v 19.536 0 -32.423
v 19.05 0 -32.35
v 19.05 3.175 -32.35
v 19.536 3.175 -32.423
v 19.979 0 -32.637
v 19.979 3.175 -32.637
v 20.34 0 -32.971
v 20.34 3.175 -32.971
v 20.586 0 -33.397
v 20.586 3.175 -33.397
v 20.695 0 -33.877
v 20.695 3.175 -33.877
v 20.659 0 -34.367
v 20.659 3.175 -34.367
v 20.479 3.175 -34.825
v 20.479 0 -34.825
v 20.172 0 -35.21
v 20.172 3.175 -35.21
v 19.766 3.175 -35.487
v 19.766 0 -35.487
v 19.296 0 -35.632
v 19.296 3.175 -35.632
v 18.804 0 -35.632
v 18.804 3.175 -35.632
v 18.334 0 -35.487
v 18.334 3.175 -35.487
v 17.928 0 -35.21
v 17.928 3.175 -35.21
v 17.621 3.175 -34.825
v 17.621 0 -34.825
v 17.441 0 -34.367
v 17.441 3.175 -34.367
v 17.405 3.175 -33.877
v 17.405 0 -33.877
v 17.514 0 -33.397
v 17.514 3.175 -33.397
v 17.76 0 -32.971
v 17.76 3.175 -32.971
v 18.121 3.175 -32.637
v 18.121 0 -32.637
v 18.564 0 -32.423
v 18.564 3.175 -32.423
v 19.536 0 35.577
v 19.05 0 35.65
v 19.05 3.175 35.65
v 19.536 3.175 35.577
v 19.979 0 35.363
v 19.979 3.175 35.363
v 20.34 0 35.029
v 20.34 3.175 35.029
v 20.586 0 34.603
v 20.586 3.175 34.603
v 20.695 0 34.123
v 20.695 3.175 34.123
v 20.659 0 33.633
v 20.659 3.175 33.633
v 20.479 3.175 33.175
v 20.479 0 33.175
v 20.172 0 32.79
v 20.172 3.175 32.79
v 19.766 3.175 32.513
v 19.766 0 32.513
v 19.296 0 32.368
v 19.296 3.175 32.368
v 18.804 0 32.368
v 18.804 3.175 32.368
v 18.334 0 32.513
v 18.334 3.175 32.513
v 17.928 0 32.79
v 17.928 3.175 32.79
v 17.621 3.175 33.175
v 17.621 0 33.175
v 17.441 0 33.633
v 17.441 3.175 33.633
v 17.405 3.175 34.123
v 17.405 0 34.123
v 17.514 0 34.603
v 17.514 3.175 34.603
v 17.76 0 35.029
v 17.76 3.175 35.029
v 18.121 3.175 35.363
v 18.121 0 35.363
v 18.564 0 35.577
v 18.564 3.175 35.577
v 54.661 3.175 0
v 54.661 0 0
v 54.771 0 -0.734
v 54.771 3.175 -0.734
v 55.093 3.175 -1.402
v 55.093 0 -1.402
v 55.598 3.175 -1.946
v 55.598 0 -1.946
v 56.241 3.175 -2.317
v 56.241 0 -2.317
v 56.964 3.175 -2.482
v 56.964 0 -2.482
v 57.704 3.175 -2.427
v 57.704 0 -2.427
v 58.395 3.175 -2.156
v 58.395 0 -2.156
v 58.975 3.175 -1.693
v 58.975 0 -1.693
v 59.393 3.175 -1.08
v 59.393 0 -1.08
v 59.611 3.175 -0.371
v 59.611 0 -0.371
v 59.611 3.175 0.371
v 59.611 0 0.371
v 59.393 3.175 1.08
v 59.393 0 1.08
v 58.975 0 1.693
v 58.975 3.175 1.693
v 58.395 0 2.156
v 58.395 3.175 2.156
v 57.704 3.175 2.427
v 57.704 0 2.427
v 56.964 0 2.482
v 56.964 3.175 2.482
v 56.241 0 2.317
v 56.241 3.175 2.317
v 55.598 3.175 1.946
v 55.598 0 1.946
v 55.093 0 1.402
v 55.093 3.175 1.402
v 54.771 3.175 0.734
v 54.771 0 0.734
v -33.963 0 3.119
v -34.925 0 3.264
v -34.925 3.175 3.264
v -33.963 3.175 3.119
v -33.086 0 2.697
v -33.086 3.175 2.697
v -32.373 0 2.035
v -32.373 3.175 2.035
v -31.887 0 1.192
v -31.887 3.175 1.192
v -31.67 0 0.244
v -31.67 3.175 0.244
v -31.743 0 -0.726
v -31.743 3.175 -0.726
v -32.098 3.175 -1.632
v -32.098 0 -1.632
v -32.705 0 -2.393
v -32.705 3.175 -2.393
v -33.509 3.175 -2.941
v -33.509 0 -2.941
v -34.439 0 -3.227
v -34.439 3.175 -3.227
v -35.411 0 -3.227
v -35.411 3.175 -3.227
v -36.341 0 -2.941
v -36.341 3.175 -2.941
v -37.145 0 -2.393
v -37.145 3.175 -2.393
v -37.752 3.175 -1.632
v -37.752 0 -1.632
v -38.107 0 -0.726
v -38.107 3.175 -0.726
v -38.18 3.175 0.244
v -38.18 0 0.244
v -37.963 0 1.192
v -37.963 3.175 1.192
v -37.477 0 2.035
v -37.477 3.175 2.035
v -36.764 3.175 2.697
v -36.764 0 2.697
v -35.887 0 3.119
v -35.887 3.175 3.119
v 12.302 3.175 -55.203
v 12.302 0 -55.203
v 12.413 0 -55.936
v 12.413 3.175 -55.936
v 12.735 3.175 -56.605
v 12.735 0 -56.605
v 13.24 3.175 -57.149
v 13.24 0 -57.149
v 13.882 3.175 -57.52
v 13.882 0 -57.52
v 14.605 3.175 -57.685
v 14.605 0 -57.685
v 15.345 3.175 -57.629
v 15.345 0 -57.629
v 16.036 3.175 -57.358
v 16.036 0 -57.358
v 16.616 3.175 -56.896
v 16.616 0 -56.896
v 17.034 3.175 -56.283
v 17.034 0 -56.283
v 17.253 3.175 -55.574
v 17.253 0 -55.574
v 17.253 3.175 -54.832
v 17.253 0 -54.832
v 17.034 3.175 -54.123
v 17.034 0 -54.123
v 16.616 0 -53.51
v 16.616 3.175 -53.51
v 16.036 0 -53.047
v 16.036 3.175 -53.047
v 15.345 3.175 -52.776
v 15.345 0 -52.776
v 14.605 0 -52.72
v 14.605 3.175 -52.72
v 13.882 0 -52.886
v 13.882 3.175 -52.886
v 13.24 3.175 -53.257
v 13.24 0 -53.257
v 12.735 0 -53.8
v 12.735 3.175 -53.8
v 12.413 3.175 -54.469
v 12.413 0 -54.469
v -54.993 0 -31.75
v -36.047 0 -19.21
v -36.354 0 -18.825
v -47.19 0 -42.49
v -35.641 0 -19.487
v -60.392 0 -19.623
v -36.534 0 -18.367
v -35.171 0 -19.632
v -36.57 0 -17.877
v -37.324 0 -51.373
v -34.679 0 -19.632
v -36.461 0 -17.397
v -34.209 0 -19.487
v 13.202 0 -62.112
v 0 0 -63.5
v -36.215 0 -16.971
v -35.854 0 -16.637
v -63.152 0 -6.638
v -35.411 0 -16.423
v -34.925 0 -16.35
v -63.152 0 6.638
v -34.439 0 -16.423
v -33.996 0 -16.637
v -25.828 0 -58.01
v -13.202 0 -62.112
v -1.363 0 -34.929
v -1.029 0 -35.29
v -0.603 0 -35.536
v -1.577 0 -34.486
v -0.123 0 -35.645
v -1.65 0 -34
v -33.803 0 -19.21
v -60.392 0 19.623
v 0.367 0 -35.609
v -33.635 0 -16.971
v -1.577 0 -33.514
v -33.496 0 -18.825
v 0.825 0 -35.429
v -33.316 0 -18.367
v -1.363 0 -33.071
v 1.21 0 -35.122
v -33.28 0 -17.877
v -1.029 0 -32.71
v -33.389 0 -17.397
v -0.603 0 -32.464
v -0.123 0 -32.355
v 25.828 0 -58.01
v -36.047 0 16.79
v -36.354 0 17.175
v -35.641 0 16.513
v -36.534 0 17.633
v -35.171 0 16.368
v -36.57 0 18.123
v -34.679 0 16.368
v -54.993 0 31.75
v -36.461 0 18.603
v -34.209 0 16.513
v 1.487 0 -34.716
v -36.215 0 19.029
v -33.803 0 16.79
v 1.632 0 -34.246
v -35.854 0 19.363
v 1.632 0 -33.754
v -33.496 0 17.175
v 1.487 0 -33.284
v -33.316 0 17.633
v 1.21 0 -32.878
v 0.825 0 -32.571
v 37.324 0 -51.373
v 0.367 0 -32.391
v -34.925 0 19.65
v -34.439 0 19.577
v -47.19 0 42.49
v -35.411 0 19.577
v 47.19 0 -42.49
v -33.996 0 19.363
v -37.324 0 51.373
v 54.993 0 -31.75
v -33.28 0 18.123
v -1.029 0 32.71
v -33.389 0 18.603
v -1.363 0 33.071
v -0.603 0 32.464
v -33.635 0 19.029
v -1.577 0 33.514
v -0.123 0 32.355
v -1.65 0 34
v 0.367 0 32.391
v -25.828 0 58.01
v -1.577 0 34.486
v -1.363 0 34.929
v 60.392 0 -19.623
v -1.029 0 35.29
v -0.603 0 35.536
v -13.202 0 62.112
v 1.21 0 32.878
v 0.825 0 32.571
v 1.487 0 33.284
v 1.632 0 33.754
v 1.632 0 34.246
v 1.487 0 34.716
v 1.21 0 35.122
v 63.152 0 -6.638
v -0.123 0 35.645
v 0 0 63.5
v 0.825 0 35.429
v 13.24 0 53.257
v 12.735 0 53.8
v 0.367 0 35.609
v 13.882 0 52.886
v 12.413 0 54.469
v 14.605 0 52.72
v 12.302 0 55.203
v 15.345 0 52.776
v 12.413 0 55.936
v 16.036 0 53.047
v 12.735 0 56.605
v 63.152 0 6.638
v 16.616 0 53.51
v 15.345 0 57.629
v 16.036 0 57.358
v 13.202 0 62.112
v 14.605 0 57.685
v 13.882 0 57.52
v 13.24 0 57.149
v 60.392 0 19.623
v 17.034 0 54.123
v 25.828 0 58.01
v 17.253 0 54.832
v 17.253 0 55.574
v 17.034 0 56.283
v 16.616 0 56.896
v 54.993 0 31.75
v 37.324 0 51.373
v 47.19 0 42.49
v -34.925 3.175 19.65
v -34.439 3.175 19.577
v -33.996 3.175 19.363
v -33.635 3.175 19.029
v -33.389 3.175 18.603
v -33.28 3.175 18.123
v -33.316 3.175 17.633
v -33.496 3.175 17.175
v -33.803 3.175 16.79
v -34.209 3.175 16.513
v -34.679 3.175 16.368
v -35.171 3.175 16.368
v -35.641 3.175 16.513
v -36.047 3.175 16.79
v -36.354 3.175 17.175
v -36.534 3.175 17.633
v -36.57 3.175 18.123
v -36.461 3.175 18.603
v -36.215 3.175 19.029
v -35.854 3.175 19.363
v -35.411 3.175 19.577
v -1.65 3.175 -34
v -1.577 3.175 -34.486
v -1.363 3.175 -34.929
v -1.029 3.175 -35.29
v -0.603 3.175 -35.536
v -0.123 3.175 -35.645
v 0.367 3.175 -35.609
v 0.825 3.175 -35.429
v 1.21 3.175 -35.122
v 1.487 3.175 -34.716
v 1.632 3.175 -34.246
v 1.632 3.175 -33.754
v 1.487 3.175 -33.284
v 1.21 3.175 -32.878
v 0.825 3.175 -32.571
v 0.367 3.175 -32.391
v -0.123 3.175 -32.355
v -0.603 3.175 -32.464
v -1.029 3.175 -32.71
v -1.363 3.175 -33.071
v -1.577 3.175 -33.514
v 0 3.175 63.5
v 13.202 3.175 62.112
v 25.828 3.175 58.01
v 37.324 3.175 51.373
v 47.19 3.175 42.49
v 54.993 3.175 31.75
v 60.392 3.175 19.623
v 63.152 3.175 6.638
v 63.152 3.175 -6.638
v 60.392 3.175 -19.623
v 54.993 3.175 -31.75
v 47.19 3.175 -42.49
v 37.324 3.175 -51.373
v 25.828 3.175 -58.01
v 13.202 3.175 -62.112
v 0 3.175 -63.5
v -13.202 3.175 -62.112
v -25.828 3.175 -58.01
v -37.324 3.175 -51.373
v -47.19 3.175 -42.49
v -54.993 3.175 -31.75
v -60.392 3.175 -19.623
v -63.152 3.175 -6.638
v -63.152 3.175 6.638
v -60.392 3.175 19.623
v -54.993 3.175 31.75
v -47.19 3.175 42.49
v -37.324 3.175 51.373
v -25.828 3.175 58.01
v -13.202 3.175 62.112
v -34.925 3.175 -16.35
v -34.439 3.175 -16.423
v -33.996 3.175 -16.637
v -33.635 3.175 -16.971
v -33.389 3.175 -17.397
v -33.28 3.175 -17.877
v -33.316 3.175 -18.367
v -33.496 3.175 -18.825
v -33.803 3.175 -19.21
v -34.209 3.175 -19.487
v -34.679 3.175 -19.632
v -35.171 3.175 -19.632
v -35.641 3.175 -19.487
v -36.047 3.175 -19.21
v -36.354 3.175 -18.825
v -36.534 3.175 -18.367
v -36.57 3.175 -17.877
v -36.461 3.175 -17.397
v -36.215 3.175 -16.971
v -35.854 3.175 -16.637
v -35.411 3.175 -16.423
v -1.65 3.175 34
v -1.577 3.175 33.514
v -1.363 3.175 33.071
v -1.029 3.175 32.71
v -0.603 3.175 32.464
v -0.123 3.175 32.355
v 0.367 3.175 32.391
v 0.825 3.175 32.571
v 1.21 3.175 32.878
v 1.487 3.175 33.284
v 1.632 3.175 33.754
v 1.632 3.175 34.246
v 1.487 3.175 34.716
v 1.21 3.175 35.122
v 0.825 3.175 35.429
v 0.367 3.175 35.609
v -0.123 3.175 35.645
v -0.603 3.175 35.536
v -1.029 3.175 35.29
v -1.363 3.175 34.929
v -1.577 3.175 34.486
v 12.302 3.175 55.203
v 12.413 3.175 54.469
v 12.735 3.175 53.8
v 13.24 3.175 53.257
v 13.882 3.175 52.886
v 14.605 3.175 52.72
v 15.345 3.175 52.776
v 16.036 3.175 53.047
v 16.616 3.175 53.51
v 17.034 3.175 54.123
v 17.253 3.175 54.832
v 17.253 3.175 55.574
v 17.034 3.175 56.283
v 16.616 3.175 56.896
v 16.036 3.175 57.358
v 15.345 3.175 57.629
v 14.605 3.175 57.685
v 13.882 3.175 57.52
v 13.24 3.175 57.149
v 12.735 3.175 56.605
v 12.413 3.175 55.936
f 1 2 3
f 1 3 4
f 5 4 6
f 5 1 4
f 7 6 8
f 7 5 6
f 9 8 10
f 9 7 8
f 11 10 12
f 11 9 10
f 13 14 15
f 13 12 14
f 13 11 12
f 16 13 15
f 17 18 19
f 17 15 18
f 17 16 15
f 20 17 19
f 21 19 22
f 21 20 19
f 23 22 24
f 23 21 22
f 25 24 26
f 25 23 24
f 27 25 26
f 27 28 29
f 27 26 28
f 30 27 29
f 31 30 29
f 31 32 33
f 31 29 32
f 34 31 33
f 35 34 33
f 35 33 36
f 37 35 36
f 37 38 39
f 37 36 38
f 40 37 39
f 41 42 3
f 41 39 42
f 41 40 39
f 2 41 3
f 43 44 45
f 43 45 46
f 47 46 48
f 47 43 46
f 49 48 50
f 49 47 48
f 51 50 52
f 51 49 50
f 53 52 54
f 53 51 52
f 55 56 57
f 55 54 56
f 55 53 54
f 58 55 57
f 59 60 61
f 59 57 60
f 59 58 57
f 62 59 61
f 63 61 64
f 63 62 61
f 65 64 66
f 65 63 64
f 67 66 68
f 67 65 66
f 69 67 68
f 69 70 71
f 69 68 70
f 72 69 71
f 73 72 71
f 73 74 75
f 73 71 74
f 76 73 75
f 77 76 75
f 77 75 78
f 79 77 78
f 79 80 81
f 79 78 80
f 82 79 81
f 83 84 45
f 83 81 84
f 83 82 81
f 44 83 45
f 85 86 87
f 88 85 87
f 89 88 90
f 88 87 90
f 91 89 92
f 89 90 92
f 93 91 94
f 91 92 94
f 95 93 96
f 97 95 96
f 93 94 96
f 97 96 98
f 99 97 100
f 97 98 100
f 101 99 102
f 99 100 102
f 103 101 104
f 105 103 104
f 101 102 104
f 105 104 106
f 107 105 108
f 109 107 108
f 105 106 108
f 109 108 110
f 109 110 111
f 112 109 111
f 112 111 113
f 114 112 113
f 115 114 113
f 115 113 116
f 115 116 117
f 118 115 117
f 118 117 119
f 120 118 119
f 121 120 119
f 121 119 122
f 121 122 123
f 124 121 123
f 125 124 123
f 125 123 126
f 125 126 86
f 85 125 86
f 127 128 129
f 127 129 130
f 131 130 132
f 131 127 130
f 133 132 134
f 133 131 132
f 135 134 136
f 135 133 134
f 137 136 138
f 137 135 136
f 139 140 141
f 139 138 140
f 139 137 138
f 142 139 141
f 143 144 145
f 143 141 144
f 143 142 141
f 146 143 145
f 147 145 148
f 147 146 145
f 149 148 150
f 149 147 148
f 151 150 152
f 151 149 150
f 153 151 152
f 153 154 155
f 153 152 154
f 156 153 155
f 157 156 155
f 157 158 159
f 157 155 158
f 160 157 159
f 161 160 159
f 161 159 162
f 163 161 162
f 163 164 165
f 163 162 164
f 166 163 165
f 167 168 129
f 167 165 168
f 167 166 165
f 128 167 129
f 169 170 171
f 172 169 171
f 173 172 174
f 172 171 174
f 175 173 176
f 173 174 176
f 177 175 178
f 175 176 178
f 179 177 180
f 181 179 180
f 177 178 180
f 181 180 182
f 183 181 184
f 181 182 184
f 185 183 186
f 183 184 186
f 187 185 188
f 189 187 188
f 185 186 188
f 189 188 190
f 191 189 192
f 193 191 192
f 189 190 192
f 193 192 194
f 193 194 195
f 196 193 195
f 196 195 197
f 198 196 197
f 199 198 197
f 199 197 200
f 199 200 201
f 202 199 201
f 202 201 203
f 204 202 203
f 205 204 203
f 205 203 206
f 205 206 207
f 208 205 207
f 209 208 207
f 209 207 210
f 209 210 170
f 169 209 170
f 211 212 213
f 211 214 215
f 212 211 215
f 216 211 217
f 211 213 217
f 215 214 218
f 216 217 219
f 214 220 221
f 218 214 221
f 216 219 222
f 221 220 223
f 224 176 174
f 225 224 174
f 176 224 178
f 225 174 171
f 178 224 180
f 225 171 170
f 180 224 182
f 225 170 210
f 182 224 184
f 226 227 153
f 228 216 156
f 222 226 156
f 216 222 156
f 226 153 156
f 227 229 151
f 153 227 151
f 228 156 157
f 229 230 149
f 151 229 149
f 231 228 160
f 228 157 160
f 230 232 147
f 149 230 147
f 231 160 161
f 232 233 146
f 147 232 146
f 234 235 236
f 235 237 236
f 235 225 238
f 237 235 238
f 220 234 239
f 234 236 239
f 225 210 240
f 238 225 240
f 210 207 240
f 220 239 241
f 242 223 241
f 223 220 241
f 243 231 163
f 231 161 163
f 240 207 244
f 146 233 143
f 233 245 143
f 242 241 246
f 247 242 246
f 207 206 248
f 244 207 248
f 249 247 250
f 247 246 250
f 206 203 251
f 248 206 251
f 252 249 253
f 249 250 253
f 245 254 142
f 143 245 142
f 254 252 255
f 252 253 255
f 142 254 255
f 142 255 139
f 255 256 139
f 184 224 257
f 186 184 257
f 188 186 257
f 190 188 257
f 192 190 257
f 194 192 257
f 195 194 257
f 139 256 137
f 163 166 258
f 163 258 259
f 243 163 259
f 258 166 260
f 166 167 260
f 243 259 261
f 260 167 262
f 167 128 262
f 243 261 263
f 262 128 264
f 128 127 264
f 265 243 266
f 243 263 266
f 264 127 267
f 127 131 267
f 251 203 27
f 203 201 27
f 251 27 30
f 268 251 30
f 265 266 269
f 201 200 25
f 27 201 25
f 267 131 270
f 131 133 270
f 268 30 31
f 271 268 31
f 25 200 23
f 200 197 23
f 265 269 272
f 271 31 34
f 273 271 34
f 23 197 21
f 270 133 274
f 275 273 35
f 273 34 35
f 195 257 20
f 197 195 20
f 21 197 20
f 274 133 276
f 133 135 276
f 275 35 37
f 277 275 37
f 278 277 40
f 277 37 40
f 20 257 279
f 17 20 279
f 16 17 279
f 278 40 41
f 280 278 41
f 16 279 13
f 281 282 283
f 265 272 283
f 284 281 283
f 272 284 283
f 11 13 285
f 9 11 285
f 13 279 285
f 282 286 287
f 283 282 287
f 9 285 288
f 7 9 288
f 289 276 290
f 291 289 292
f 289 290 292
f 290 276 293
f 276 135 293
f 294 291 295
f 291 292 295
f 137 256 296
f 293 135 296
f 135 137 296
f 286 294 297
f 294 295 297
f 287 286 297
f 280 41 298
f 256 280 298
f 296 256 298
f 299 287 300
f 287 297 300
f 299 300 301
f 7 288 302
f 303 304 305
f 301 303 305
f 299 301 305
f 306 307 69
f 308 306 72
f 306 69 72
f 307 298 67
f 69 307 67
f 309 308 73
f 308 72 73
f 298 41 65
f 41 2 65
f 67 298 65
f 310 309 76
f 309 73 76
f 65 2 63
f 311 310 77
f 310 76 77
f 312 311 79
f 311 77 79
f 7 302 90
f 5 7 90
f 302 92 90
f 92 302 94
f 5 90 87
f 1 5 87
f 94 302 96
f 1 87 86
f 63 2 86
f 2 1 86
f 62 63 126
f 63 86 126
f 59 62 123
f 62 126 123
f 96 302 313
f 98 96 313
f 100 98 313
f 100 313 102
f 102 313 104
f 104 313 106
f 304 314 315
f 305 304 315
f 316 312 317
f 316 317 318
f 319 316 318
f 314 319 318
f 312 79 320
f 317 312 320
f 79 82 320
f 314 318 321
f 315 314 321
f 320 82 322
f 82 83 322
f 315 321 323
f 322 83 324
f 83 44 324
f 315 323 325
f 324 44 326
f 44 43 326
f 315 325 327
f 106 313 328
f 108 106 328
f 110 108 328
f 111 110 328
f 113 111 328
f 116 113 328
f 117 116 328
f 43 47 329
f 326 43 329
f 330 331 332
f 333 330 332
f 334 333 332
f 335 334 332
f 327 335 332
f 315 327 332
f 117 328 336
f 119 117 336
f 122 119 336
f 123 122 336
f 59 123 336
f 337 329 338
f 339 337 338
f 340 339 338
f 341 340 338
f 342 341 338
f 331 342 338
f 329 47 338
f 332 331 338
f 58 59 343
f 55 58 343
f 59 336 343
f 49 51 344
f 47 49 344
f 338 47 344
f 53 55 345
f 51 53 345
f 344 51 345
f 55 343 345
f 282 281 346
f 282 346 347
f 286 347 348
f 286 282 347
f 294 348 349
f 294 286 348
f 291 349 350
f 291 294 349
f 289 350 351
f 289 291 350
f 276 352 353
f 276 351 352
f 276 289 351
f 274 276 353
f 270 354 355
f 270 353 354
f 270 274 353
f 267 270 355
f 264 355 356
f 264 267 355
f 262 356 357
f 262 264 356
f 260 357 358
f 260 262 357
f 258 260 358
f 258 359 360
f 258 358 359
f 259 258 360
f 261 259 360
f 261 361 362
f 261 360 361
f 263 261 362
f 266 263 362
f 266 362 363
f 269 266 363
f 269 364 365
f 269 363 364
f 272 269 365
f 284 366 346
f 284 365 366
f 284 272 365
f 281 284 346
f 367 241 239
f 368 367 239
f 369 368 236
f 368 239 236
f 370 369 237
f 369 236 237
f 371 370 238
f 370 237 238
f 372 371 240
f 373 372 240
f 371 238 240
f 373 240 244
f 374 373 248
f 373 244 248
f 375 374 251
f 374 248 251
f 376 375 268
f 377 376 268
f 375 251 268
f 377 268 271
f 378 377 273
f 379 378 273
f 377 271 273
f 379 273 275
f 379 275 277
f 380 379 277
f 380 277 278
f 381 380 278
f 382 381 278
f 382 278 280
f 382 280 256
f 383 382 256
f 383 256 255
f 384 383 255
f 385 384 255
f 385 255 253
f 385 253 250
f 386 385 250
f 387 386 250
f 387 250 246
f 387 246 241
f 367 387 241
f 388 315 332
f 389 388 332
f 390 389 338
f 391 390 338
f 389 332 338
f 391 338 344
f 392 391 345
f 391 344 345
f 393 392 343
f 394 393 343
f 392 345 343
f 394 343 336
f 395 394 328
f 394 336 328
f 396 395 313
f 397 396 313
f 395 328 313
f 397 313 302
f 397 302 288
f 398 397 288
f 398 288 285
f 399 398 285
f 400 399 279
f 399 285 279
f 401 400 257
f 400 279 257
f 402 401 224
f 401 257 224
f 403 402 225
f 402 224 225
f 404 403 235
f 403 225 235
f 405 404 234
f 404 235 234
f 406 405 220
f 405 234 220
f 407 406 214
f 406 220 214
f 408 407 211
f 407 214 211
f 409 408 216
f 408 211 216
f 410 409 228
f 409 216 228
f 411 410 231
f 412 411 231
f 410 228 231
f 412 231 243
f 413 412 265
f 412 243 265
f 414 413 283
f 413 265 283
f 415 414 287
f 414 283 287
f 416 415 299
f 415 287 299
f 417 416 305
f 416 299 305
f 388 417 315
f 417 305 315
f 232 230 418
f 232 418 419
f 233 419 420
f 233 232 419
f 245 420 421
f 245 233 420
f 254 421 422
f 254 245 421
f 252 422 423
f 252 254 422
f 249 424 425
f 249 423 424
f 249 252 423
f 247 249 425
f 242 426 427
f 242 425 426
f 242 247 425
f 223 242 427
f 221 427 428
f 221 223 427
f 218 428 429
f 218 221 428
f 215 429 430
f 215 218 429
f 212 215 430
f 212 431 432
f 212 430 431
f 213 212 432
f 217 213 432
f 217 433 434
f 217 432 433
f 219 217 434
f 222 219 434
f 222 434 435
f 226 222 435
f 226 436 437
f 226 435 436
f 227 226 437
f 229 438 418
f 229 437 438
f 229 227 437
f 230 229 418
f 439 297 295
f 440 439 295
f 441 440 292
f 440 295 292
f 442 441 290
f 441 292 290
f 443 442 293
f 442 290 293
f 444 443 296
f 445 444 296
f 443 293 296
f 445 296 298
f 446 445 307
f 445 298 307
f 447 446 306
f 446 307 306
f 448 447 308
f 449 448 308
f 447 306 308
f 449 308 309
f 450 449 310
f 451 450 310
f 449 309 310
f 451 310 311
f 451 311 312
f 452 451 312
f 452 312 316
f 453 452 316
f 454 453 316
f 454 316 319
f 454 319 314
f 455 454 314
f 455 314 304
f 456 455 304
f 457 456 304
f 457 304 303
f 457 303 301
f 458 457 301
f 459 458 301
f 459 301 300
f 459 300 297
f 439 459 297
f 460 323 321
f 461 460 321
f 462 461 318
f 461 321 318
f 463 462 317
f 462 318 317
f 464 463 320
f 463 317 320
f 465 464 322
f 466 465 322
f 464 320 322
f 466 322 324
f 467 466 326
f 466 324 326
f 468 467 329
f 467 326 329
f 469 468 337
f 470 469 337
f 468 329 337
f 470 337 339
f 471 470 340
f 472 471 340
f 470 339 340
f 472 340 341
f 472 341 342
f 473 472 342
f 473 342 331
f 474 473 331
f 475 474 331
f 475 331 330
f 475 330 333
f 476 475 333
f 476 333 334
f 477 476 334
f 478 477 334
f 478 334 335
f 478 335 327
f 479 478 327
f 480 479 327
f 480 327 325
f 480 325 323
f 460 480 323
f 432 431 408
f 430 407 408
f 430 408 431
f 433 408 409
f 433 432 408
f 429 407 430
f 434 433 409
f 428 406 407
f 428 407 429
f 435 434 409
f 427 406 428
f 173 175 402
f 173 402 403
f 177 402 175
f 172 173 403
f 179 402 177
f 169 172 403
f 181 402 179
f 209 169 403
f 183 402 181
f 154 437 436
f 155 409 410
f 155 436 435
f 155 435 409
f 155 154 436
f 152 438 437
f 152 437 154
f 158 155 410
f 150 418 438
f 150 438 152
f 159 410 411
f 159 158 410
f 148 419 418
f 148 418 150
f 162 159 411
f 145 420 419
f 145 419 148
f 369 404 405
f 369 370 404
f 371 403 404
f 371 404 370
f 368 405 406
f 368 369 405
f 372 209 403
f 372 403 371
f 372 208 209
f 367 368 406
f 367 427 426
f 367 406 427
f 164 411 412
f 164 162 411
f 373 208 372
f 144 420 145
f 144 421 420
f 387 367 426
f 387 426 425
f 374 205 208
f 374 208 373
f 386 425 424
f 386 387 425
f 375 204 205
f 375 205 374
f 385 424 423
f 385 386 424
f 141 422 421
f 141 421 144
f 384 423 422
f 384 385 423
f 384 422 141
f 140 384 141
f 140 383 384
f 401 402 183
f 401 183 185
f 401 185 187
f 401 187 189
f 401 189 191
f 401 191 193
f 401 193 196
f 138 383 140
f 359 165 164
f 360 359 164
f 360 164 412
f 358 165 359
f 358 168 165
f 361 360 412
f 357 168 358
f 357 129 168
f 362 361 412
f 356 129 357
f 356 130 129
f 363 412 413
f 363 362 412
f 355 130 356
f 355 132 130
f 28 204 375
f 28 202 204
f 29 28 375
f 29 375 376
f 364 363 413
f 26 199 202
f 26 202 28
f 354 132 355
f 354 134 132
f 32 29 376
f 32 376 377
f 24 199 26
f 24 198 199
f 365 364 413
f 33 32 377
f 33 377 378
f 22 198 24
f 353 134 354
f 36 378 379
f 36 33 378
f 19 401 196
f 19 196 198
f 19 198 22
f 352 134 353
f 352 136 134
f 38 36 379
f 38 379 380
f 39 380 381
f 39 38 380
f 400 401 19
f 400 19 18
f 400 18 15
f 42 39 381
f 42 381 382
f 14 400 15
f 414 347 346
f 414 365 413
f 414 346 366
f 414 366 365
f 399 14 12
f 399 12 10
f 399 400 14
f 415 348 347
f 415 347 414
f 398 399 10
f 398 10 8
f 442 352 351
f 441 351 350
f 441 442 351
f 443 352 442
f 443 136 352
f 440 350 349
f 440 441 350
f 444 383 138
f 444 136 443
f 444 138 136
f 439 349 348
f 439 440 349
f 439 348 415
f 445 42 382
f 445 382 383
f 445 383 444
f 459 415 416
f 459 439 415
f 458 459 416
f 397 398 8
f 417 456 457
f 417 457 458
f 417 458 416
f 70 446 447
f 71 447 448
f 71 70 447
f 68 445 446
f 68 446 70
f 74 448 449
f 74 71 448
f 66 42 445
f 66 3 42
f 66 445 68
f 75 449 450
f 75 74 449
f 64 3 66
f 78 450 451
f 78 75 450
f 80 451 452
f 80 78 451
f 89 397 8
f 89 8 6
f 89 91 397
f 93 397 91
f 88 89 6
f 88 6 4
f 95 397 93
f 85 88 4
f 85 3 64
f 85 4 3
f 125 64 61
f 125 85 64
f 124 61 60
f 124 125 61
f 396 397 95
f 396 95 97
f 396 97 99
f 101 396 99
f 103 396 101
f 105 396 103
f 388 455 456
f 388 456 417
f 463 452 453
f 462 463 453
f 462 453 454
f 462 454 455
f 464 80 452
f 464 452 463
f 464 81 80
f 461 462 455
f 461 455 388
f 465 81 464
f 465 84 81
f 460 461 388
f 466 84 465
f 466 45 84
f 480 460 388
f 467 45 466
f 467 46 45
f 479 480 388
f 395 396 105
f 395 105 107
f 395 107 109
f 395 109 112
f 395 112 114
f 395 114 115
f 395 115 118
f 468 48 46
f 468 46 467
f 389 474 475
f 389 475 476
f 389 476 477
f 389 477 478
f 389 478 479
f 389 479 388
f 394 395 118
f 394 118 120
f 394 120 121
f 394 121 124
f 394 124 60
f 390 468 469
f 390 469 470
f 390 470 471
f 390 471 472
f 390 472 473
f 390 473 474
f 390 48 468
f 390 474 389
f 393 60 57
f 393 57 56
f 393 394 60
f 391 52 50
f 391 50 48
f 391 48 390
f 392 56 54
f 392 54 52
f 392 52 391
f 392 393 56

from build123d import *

# Parameters (mm, degrees)
SKETCH1_R                   = 63.5
BOSS_EXTRUDE1_DEPTH         = 3.175
TAP_DRILL_FOR_M4X0_7_TAP1_D = 3.3
F_9_0_196_DIAMETER_HOLE1_D  = 4.9784
CUT_EXTRUDE1_DEPTH          = 90.858670283
CUT_EXTRUDE1_DEPTH_BACK     = 90.858670283
SKETCH12_R                  = 3.2639
SKETCH12_R_2                = 1.65


with BuildPart() as part:
    # Sketch1 → Boss-Extrude1 (new body)
    with BuildSketch(Plane(origin=(0, 0, 0), x_dir=(1, 0, 0), z_dir=(0, 1, 0))):
        with Locations(Location((0, 0, 0), (0, 0, 270))):
            Circle(SKETCH1_R)
    extrude(amount=BOSS_EXTRUDE1_DEPTH)

    # Tap Drill for M4x0.7 Tap1 (through all)
    with Locations(Plane(origin=(0, 3.175, 0), x_dir=(1, 0, 0), z_dir=(0, 1, 0))):
        with Locations((0, 34), (0, -34)):
            Hole(TAP_DRILL_FOR_M4X0_7_TAP1_D / 2)

    # #9 (0.196) Diameter Hole1 (through all)
    with Locations(Plane(origin=(0, 3.175, 0), x_dir=(1, 0, 0), z_dir=(0, 1, 0))):
        with Locations((14.791508428, 55.202660972), (57.15, 0), (14.791508428, -55.202660972)):
            Hole(F_9_0_196_DIAMETER_HOLE1_D / 2)

    # Sketch12 → Cut-Extrude1 (cut, two sides: drawn at the far end of the back side and taken through both)
    with BuildSketch(Plane(origin=(0, 3.175, 0), x_dir=(1, 0, 0), z_dir=(0, 1, 0)).offset(-CUT_EXTRUDE1_DEPTH_BACK)):
        with Locations(Location((-34.925, 0, 0), (0, 0, 270))):
            Circle(SKETCH12_R)
        with Locations(Location((-34.925, 17.9999894, 0), (0, 0, 270))):
            Circle(SKETCH12_R_2)
        with Locations(Location((-34.925, -17.9999894, 0), (0, 0, 270))):
            Circle(SKETCH12_R_2)
        with Locations(Location((19.05, 34, 0), (0, 0, 270))):
            Circle(SKETCH12_R_2)
        with Locations(Location((19.05, -34, 0), (0, 0, 270))):
            Circle(SKETCH12_R_2)
    extrude(amount=CUT_EXTRUDE1_DEPTH + CUT_EXTRUDE1_DEPTH_BACK, mode=Mode.SUBTRACT)


solid = part.part
